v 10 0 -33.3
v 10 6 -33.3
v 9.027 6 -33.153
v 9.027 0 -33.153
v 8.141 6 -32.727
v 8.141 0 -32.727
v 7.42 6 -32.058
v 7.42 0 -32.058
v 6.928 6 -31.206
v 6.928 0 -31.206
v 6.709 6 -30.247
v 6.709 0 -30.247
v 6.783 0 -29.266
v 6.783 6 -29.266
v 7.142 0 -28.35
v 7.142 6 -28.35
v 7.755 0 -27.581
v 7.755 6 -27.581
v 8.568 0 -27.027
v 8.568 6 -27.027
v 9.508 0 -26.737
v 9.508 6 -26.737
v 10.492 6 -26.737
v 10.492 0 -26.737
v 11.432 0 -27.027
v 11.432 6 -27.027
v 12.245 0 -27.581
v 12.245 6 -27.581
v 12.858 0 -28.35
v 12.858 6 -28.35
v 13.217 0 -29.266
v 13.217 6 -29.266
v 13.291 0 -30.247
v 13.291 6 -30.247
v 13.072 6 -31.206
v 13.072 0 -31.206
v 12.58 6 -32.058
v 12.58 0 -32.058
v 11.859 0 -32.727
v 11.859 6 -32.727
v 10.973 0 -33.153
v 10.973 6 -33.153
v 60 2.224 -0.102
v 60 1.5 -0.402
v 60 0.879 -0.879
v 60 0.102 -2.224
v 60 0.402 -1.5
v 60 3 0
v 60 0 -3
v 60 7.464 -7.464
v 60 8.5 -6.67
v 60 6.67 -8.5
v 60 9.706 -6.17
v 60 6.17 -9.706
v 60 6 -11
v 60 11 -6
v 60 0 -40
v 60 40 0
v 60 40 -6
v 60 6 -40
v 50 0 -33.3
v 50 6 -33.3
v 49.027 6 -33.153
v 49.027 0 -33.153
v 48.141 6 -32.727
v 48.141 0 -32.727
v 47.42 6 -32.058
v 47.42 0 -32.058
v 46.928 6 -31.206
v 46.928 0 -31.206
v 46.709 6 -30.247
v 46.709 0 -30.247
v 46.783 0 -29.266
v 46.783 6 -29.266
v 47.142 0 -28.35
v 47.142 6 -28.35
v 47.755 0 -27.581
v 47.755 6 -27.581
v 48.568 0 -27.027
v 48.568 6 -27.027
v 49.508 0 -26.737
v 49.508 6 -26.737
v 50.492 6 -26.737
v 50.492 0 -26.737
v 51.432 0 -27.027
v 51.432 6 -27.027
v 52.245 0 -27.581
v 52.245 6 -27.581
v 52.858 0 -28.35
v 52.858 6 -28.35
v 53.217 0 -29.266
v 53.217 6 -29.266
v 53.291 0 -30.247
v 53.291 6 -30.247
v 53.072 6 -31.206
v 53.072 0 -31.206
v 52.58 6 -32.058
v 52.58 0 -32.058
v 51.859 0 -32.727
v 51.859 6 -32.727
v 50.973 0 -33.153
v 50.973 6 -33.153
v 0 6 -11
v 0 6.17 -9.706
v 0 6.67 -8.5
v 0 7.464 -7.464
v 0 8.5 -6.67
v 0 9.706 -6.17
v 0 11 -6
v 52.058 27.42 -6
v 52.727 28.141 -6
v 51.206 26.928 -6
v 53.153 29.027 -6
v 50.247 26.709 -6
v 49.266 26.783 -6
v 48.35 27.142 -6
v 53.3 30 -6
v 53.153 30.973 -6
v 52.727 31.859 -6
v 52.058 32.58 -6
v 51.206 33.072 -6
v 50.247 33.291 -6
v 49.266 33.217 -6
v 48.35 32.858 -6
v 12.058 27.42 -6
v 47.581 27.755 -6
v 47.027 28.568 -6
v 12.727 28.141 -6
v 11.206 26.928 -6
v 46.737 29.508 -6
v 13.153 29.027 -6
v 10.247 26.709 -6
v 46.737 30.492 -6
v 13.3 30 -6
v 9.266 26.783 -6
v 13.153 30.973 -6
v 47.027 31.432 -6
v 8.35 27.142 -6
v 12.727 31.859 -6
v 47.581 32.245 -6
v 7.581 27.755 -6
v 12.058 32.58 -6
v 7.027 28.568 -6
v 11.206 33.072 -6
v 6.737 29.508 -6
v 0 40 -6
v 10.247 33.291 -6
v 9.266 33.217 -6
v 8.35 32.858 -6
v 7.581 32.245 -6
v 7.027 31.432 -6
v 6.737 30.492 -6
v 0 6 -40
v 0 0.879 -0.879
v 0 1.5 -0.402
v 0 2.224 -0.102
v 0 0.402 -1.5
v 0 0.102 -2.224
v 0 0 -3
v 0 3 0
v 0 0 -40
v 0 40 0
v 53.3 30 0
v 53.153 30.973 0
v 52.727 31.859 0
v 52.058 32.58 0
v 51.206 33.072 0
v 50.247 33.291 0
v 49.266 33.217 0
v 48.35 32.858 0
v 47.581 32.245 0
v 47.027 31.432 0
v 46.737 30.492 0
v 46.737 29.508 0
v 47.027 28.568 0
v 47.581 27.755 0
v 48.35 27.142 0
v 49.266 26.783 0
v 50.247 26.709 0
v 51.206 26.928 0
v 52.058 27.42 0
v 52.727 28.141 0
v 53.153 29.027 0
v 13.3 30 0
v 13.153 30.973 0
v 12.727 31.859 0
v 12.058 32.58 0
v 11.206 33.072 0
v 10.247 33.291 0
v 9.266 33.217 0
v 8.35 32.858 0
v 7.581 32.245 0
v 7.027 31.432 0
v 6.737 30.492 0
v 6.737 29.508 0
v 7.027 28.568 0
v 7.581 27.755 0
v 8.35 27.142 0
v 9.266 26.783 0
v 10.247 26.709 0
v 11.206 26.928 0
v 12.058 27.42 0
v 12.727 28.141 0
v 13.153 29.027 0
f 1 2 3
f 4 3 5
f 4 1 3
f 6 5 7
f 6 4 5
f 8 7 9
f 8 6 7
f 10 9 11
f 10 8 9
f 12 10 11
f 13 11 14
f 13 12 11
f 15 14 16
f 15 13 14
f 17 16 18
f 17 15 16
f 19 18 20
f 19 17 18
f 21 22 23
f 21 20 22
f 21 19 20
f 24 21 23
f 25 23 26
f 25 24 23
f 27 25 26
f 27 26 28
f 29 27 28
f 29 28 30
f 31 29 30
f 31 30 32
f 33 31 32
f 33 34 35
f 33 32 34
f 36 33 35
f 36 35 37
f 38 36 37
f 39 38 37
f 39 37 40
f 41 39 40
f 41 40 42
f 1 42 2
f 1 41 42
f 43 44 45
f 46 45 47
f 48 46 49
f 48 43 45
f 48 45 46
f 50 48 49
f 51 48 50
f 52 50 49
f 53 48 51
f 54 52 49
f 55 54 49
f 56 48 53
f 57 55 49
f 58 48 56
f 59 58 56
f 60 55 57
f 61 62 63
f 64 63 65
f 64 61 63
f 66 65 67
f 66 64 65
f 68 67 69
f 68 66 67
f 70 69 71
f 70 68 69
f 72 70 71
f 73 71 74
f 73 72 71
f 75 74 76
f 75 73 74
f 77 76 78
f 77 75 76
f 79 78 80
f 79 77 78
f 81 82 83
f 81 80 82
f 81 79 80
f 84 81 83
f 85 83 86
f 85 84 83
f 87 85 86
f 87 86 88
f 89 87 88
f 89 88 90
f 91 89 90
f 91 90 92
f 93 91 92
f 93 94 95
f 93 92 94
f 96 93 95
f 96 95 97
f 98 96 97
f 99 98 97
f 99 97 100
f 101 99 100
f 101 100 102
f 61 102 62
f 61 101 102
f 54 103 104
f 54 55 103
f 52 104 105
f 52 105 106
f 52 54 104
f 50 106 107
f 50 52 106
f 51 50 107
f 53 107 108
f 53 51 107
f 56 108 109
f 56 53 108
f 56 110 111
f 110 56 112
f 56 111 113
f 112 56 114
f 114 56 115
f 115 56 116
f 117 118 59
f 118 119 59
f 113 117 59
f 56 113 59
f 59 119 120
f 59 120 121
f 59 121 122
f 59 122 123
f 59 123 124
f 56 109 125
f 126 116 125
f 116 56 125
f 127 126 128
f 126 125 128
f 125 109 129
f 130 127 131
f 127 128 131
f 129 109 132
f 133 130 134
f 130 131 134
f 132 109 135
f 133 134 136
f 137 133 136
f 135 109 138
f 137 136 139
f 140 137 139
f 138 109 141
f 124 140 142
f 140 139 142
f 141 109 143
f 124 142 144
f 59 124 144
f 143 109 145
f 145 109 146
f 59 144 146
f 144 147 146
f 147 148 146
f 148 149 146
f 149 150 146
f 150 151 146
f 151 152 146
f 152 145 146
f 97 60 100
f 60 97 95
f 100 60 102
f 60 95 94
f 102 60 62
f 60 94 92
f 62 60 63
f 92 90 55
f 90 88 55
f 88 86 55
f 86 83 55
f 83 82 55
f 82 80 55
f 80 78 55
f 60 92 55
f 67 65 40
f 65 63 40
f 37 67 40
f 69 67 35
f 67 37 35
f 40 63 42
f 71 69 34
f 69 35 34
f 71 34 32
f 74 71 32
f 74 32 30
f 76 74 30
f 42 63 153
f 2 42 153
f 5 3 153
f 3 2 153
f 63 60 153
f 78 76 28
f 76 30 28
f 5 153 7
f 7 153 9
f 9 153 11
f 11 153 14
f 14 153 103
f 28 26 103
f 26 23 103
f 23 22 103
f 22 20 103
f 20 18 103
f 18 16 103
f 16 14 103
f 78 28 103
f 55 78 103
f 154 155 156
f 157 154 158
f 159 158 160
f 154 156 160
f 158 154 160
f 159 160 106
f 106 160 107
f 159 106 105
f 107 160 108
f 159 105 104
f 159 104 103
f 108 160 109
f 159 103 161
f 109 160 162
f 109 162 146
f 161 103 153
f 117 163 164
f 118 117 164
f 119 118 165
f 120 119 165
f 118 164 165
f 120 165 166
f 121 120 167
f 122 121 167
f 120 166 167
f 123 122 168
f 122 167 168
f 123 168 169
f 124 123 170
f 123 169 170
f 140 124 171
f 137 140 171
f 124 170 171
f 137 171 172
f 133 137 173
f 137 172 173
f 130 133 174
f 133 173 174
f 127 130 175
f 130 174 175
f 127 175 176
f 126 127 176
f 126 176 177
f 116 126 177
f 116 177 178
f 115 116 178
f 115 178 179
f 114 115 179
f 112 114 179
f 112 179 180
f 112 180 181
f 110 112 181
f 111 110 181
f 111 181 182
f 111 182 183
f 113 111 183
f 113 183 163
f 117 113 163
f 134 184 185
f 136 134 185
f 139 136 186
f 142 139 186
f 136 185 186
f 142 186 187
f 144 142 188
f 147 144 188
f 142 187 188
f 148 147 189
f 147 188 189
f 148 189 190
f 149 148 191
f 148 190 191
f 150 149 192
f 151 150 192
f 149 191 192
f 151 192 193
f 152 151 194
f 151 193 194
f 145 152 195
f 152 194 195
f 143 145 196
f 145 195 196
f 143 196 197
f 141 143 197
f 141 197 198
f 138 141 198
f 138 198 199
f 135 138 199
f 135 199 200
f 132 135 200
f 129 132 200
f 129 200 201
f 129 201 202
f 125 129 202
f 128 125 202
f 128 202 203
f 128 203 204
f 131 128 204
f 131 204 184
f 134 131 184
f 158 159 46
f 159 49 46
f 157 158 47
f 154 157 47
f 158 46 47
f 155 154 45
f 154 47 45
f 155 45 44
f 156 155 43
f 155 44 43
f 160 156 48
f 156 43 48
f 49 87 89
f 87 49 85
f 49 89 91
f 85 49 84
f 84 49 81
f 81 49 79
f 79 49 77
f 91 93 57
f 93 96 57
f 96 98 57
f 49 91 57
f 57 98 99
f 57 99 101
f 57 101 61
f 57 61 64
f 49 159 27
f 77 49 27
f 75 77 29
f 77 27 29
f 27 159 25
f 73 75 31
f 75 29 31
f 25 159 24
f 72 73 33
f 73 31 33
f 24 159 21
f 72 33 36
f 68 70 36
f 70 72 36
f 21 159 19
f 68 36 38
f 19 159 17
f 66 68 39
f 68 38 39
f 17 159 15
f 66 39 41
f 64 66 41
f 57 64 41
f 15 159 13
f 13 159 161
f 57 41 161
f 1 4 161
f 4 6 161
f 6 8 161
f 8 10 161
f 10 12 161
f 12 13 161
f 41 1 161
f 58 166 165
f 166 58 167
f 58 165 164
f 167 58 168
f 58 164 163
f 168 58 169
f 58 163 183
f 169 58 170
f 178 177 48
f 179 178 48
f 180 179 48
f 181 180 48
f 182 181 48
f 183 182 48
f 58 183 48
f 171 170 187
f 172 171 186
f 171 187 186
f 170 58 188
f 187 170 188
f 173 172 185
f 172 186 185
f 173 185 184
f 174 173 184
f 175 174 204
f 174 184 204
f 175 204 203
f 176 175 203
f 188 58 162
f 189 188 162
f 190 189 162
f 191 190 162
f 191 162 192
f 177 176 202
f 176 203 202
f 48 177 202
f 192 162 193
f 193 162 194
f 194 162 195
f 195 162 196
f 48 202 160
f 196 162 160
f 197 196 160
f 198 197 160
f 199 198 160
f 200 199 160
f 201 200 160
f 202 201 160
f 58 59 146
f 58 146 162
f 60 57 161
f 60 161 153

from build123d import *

# Parameters (mm, degrees)
EXTRUDE_1_DEPTH     = 60
SKETCH_2_R          = 3.3
CUT_EXTRUDE_1_DEPTH = 83.462112512
SKETCH_3_R          = 3.3
CUT_EXTRUDE_2_DEPTH = 83.462112512
FILLET_1_R          = 5
FILLET_2_R          = 3


with BuildPart() as part:
    # 草圖1 → 填料-伸長1 (new body)
    with BuildSketch(Plane(origin=(0, 0, 0), x_dir=(0, 0, -1), z_dir=(1, 0, 0))):
        Polygon((0, 0), (40, 0), (40, 6), (6, 6), (6, 40), (0, 40), align=None)
    extrude(amount=EXTRUDE_1_DEPTH)

    # 草圖2 → 除料-伸長1 (cut, through all)
    with BuildSketch(Plane(origin=(0, 0, 0), x_dir=(1, 0, 0), z_dir=(0, 1, 0))):
        with Locations(Location((10, 30, 0), (0, 0, 90))):
            Circle(SKETCH_2_R)
        with Locations(Location((50, 30, 0), (0, 0, 90))):
            Circle(SKETCH_2_R)
    extrude(amount=CUT_EXTRUDE_1_DEPTH, mode=Mode.SUBTRACT)

    # 草圖3 → 除料-伸長2 (cut, through all)
    with BuildSketch(Plane.XY):
        with Locations((10, 30)):
            Circle(SKETCH_3_R)
        with Locations((50, 30)):
            Circle(SKETCH_3_R)
    extrude(amount=-CUT_EXTRUDE_2_DEPTH, mode=Mode.SUBTRACT)

    # 圓角1
    fillet_1_edges = [part.edges().sort_by_distance(p)[0] for p in [
        (30, 6, -6),
    ]]
    fillet(fillet_1_edges, radius=FILLET_1_R)

    # 圓角2
    fillet_2_edges = [part.edges().sort_by_distance(p)[0] for p in [
        (30, 0, 0),
    ]]
    fillet(fillet_2_edges, radius=FILLET_2_R)


solid = part.part
